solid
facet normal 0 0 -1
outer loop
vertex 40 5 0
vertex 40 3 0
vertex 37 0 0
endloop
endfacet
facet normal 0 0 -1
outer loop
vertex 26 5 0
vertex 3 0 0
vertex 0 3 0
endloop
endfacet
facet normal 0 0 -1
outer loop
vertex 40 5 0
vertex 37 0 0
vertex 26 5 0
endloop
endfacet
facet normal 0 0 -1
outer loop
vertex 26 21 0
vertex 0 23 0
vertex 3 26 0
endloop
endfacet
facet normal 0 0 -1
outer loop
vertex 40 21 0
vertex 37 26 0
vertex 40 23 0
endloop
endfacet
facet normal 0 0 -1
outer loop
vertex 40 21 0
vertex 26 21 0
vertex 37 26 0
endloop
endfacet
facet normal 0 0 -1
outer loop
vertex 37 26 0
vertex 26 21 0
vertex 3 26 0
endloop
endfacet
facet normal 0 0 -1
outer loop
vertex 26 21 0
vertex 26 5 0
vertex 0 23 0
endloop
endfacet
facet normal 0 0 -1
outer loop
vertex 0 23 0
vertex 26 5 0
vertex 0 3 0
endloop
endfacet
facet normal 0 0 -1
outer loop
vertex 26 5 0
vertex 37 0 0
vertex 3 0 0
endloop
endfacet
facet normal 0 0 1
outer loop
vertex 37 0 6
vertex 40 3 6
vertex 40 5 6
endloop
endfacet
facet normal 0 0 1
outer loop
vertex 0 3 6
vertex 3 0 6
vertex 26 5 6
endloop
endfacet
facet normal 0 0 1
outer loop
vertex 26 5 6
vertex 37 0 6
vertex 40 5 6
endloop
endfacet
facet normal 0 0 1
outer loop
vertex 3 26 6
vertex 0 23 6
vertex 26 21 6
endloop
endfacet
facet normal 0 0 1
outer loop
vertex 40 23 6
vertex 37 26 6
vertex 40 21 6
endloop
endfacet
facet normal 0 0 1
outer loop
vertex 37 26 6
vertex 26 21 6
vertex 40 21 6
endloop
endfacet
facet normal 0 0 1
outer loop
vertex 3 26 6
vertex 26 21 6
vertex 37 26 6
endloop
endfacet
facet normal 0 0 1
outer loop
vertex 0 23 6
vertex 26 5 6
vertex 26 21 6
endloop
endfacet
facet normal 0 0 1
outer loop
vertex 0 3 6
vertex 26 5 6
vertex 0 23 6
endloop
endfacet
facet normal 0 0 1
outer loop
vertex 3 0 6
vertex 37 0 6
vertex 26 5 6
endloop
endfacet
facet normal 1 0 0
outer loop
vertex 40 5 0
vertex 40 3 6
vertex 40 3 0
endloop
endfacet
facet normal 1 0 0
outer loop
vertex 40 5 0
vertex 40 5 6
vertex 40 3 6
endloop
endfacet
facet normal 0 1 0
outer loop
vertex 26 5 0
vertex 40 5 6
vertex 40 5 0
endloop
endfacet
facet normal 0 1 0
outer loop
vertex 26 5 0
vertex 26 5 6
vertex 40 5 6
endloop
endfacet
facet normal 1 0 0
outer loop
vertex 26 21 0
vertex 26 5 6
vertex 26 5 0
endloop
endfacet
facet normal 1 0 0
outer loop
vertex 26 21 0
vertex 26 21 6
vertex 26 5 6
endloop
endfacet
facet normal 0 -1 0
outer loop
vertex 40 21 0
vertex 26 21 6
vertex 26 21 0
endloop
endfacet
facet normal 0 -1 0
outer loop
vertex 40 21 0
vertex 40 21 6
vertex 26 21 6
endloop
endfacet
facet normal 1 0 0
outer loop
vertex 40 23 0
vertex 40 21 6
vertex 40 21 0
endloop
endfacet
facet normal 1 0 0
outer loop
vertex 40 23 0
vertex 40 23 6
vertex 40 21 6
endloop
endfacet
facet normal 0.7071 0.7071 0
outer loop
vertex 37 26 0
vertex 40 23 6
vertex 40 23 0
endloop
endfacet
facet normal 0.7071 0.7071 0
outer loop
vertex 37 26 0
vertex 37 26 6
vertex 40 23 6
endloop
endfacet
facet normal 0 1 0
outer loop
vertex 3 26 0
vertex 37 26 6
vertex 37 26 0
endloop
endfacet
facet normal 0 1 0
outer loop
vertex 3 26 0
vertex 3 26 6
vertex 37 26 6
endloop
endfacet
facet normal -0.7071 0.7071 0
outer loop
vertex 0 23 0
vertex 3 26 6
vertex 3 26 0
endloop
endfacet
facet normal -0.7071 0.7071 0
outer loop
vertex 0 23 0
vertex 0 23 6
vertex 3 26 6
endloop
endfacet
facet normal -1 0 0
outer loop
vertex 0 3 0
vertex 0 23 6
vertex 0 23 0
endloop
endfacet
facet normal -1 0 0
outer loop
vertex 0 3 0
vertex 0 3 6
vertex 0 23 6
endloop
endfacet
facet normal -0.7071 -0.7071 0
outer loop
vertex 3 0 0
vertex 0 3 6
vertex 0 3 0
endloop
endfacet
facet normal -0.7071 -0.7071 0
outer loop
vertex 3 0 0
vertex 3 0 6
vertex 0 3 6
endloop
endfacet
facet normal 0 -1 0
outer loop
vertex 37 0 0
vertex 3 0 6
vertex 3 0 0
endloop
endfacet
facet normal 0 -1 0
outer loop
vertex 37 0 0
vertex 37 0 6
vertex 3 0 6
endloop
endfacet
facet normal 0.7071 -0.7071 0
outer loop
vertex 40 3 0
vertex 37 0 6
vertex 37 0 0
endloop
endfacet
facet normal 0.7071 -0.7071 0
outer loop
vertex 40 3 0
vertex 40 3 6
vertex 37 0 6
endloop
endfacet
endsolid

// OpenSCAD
$fn = 32;

// ----------------------------------------------------------------------
// C washer: 40 x 26 mm plate with an open slot
// ----------------------------------------------------------------------

// --- parameters (mm) ---
profile_height = 6;       // extrusion height
profile_points = 12;      // points of the closed outline

profile = [[3, 0], [37, 0], [40, 3], [40, 5], [26, 5], [26, 21], [40, 21], [40, 23], [37, 26], [3, 26], [0, 23], [0, 3]];  // single closed polygon, 12 points, counter clockwise

// --- the one profile operation ---
linear_extrude(height = profile_height) polygon(points = profile);
